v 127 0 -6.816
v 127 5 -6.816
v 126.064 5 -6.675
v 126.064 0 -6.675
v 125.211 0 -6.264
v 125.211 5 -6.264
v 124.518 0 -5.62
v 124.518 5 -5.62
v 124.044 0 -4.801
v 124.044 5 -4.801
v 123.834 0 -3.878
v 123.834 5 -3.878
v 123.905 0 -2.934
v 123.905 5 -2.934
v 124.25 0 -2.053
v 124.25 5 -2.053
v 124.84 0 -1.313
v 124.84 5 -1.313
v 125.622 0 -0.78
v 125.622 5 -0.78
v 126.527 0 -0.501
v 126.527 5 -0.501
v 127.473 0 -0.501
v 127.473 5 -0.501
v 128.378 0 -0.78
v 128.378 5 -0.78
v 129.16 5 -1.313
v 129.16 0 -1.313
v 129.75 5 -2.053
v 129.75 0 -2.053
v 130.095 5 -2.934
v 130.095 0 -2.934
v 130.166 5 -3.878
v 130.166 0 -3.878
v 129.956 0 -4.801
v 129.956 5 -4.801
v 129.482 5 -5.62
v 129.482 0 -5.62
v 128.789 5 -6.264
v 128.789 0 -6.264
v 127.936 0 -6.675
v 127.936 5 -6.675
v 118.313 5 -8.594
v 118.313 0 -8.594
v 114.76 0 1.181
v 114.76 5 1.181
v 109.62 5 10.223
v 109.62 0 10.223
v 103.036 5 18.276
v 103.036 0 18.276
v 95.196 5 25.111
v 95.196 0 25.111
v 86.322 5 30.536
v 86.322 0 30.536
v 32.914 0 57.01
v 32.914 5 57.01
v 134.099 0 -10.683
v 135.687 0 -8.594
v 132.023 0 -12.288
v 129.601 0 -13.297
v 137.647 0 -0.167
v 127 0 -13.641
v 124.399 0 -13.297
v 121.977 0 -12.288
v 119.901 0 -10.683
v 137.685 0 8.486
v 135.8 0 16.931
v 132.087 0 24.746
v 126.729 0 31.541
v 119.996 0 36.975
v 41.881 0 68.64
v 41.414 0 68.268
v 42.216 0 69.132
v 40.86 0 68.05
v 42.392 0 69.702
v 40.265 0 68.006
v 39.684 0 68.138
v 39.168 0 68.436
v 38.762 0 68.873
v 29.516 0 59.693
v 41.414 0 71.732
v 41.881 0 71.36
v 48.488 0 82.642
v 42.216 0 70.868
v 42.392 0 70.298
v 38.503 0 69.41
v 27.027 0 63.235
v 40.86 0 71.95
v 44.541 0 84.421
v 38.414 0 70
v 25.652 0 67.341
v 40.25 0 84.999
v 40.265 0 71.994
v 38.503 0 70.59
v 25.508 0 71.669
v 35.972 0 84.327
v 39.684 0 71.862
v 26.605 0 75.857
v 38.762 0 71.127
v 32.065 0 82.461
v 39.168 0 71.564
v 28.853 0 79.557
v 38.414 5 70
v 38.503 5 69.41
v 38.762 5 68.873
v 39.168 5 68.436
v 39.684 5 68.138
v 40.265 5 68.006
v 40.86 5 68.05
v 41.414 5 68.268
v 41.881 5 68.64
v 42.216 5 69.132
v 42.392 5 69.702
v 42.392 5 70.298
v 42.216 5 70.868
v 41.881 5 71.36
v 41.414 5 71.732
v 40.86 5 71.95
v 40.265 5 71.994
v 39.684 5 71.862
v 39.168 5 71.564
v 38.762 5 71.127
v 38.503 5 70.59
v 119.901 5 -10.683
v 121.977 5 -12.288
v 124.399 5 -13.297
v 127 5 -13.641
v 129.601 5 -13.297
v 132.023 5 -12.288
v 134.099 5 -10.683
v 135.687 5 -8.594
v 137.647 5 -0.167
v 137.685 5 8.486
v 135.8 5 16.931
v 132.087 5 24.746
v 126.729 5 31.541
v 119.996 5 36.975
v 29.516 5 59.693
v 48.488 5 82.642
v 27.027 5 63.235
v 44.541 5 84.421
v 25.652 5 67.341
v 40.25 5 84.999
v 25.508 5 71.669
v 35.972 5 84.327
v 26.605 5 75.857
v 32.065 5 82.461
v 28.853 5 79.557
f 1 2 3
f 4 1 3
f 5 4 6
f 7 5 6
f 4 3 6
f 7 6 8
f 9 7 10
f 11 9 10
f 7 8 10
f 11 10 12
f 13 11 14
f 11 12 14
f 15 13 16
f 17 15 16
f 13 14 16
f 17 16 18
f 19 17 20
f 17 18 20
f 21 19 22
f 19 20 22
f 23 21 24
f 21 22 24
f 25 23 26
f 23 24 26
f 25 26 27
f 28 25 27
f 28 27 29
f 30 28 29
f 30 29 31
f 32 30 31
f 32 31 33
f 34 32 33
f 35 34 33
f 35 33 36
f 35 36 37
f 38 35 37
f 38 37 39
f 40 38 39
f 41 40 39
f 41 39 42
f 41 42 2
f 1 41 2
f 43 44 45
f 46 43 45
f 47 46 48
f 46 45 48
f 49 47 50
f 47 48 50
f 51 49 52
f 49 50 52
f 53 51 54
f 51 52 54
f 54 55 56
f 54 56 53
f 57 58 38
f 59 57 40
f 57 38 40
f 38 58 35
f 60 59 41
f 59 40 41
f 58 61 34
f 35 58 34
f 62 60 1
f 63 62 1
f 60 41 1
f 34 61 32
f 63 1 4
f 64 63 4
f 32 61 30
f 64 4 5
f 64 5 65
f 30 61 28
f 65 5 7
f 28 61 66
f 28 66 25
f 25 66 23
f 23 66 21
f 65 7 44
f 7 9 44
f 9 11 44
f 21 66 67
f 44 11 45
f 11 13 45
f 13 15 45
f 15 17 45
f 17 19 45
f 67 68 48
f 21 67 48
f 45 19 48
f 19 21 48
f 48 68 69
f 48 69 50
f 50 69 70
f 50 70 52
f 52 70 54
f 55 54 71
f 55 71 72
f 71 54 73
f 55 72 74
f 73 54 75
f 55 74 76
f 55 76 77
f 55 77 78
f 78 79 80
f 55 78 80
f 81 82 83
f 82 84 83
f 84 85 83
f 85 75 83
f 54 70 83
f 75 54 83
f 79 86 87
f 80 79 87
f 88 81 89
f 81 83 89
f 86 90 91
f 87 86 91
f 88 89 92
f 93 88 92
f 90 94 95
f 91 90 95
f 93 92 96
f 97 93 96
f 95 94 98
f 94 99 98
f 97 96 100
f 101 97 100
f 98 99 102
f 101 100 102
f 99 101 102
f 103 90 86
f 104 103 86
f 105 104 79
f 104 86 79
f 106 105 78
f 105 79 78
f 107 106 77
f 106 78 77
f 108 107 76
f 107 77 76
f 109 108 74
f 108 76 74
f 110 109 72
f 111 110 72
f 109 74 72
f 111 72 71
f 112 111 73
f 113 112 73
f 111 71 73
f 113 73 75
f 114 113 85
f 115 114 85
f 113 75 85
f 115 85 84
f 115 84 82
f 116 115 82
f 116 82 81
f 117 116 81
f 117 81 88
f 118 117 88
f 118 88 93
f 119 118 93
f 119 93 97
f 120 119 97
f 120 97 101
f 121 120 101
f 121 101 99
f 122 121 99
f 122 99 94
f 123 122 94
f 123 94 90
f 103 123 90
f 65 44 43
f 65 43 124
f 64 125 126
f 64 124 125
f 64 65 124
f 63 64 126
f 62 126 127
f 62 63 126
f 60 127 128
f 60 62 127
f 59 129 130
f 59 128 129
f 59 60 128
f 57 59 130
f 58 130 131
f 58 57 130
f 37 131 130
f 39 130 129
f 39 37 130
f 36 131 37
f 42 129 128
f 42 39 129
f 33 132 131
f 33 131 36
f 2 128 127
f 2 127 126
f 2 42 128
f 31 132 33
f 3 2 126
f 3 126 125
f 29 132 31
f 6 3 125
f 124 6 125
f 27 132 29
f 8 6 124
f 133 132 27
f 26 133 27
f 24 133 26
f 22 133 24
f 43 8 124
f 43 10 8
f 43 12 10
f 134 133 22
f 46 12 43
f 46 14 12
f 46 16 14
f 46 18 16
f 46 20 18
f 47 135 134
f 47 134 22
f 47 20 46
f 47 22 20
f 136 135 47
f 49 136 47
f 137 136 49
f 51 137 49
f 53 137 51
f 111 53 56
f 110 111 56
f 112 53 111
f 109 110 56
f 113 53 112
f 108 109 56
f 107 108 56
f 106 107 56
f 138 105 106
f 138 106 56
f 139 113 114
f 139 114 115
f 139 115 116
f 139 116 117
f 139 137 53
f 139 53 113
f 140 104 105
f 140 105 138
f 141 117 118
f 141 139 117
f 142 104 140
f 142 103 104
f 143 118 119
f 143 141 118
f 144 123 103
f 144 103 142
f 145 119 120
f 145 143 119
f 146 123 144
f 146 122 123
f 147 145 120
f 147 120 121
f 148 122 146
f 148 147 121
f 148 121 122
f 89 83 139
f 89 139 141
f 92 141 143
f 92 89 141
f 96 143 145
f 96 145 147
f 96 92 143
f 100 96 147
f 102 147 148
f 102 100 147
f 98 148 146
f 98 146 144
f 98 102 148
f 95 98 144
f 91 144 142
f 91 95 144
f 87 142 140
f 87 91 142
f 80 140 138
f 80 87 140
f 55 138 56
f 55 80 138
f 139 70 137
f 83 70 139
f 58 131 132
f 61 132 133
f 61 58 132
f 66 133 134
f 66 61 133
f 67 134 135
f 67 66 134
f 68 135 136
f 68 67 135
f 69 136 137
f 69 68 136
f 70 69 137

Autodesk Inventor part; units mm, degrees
ref_plane "YZ Plane" through (0, 0, 0) normal (1, 0, 0) x (0, 1, 0)
ref_plane "XZ Plane" through (0, 0, 0) normal (0, 1, 0) x (-1, 0, 0)
ref_plane "XY Plane" through (0, 0, 0) normal (0, 0, 1) x (1, 0, 0)
sketch "Cara" plane through (0, 0, 0) normal (0, 0, 1) x (1, 0, 0)
  line L0 (-22.1935, -24.9393) -> (-15.1747, -17.9205)
  arc A0 (-12.474, -17.8034) -> (-15.1747, -17.9205) centre (-13.7605, -19.3347) ccw
  arc A1 (-12.474, -17.8034) -> (-6.107, -21.4794) centre (1.0981, -1.6477) ccw
  arc A2 (-4.8581, -23.8768) -> (-6.107, -21.4794) centre (-6.79, -23.3592) ccw
  line L1 (-4.8581, -23.8768) -> (-7.4272, -33.4646)
  arc A3 (-9.9928, -34.8439) -> (-7.4272, -33.4646) centre (-9.359, -32.947) ccw
  arc A4 (-22.1052, -27.8509) -> (-9.9928, -34.8439) centre (1.0981, -1.6477) ccw
  arc A5 (-22.1935, -24.9393) -> (-22.1052, -27.8509) centre (-20.7793, -26.3535) ccw
  line L2 (9.6235, -33.4646) -> (7.0544, -23.8768)
  arc A6 (8.3033, -21.4794) -> (7.0544, -23.8768) centre (8.9863, -23.3592) ccw
  arc A7 (8.3033, -21.4794) -> (14.6703, -17.8034) centre (1.0981, -1.6477) ccw
  arc A8 (17.371, -17.9205) -> (14.6703, -17.8034) centre (15.9568, -19.3347) ccw
  line L3 (17.371, -17.9205) -> (24.3898, -24.9393)
  arc A9 (24.3015, -27.8509) -> (24.3898, -24.9393) centre (22.9756, -26.3535) ccw
  arc A10 (12.1891, -34.8439) -> (24.3015, -27.8509) centre (1.0981, -1.6477) ccw
  arc A11 (9.6235, -33.4646) -> (12.1891, -34.8439) centre (11.5553, -32.947) ccw
  line L4 (32.9151, -10.173) -> (23.3272, -7.604)
  arc A12 (21.8755, -5.3237) -> (23.3272, -7.604) centre (23.8449, -5.6721) ccw
  arc A13 (21.8755, -5.3237) -> (21.8755, 2.0283) centre (1.0981, -1.6477) ccw
  arc A14 (23.3272, 4.3086) -> (21.8755, 2.0283) centre (23.8449, 2.3767) ccw
  line L5 (23.3272, 4.3086) -> (32.9151, 6.8776)
  arc A15 (35.3924, 5.3454) -> (32.9151, 6.8776) centre (33.4327, 4.9458) ccw
  arc A16 (35.3924, -8.6408) -> (35.3924, 5.3454) centre (1.0981, -1.6477) ccw
  arc A17 (32.9151, -10.173) -> (35.3924, -8.6408) centre (33.4327, -8.2412) ccw
  line L6 (24.3898, 21.6439) -> (17.371, 14.6251)
  arc A18 (14.6703, 14.508) -> (17.371, 14.6251) centre (15.9568, 16.0394) ccw
  arc A19 (14.6703, 14.508) -> (8.3033, 18.184) centre (1.0981, -1.6477) ccw
  arc A20 (7.0544, 20.5814) -> (8.3033, 18.184) centre (8.9863, 20.0638) ccw
  line L7 (7.0544, 20.5814) -> (9.6235, 30.1693)
  arc A21 (12.1891, 31.5486) -> (9.6235, 30.1693) centre (11.5553, 29.6516) ccw
  arc A22 (24.3015, 24.5555) -> (12.1891, 31.5486) centre (1.0981, -1.6477) ccw
  arc A23 (24.3898, 21.6439) -> (24.3015, 24.5555) centre (22.9756, 23.0582) ccw
  line L8 (-7.4272, 30.1693) -> (-4.8581, 20.5814)
  arc A24 (-6.107, 18.184) -> (-4.8581, 20.5814) centre (-6.79, 20.0638) ccw
  arc A25 (-6.107, 18.184) -> (-12.474, 14.508) centre (1.0981, -1.6477) ccw
  arc A26 (-15.1747, 14.6251) -> (-12.474, 14.508) centre (-13.7605, 16.0394) ccw
  line L9 (-15.1747, 14.6251) -> (-22.1935, 21.6439)
  arc A27 (-22.1052, 24.5555) -> (-22.1935, 21.6439) centre (-20.7793, 23.0582) ccw
  arc A28 (-9.9928, 31.5486) -> (-22.1052, 24.5555) centre (1.0981, -1.6477) ccw
  arc A29 (-7.4272, 30.1693) -> (-9.9928, 31.5486) centre (-9.359, 29.6516) ccw
  line L10 (-30.7188, 6.8776) -> (-21.131, 4.3086)
  arc A30 (-19.6792, 2.0283) -> (-21.131, 4.3086) centre (-21.6486, 2.3767) ccw
  arc A31 (-19.6792, 2.0283) -> (-19.6792, -5.3237) centre (1.0981, -1.6477) ccw
  arc A32 (-21.131, -7.604) -> (-19.6792, -5.3237) centre (-21.6486, -5.6721) ccw
  line L11 (-21.131, -7.604) -> (-30.7188, -10.173)
  arc A33 (-33.1961, -8.6408) -> (-30.7188, -10.173) centre (-31.2365, -8.2412) ccw
  arc A34 (-33.1961, 5.3454) -> (-33.1961, -8.6408) centre (1.0981, -1.6477) ccw
  arc A35 (-30.7188, 6.8776) -> (-33.1961, 5.3454) centre (-31.2365, 4.9458) ccw
  circle A36 centre (-37.4568, -19.3542) radius 1.5875
  circle A37 centre (39.653, 16.0588) radius 1.5875
  circle A38 centre (-16.6083, 36.9072) radius 1.5875
  circle A39 centre (18.8046, -40.2026) radius 1.5875
  circle A40 centre (1.0981, -1.6477) radius 15.5
  arc A41 (13.186, 39.6183) -> (16.9444, 39.4394) centre (15.4349, 47.2957) ccw
  arc A42 (13.186, 39.6183) -> (-10.9897, 39.6183) centre (1.0981, -1.6477) ccw
  arc A43 (-15.0916, 39.5133) -> (-10.9897, 39.6183) centre (-13.2386, 47.2957) ccw
  arc A44 (-15.0916, 39.5133) -> (-19.5734, 37.455) centre (-16.0181, 35.6221) ccw
  arc A45 (-22.3261, 34.412) -> (-19.5734, 37.455) centre (-26.6841, 41.1208) ccw
  arc A46 (-22.3261, 34.412) -> (-34.8255, 21.9848) centre (1.0981, -1.6477) ccw
  arc A47 (-37.5746, 19.4158) -> (-34.8255, 21.9848) centre (-41.5089, 26.3816) ccw
  arc A48 (-39.989, 14.1986) -> (-37.5746, 19.4158) centre (-37.4054, 16.1703) ccw
  arc A49 (-40.1679, 10.4402) -> (-39.989, 14.1986) centre (-47.8453, 12.6891) ccw
  arc A50 (-40.1679, 10.4402) -> (-40.2027, -13.6161) centre (1.0981, -1.6477) ccw
  arc A51 (-40.1338, -17.8165) -> (-40.2027, -13.6161) centre (-47.8865, -15.8428) ccw
  arc A52 (-40.1338, -17.8165) -> (-38.0349, -22.3868) centre (-36.2575, -18.8034) ccw
  arc A53 (-34.8937, -25.1762) -> (-38.0349, -22.3868) centre (-41.5898, -29.5536) ccw
  arc A54 (-34.8937, -25.1762) -> (-22.5344, -37.5713) centre (1.0981, -1.6477) ccw
  arc A55 (-19.9654, -40.3204) -> (-22.5344, -37.5713) centre (-26.9311, -44.2547) ccw
  arc A56 (-14.7481, -42.7348) -> (-19.9654, -40.3204) centre (-16.7198, -40.1512) ccw
  arc A57 (-10.9897, -42.9137) -> (-14.7481, -42.7348) centre (-13.2386, -50.5911) ccw
  arc A58 (-10.9897, -42.9137) -> (13.0666, -42.9485) centre (1.0981, -1.6477) ccw
  arc A59 (17.2235, -42.8687) -> (13.0666, -42.9485) centre (15.2932, -50.6324) ccw
  arc A60 (17.2235, -42.8687) -> (21.7574, -40.7935) centre (18.1887, -38.9869) ccw
  arc A61 (24.5347, -37.6994) -> (21.7574, -40.7935) centre (28.895, -44.4067) ccw
  arc A62 (24.5347, -37.6994) -> (37.0217, -25.2802) centre (1.0981, -1.6477) ccw
  arc A63 (39.7709, -22.7112) -> (37.0217, -25.2802) centre (43.7052, -29.6769) ccw
  arc A64 (42.1093, -17.3982) -> (39.7709, -22.7112) centre (39.6017, -19.4656) ccw
  arc A65 (42.3332, -13.8408) -> (42.1093, -17.3982) centre (50.0048, -16.1093) ccw
  arc A66 (42.3332, -13.8408) -> (42.3989, 10.3207) centre (1.0981, -1.6477) ccw
  arc A67 (42.3301, 14.5211) -> (42.3989, 10.3207) centre (50.0828, 12.5474) ccw
  arc A68 (42.3301, 14.5211) -> (40.2312, 19.0914) centre (38.4538, 15.508) ccw
  arc A69 (37.09, 21.8808) -> (40.2312, 19.0914) centre (43.7861, 26.2582) ccw
  arc A70 (37.09, 21.8808) -> (24.7307, 34.2759) centre (1.0981, -1.6477) ccw
  arc A71 (22.1617, 37.0251) -> (24.7307, 34.2759) centre (29.1274, 40.9594) ccw
  arc A72 (16.9444, 39.4394) -> (22.1617, 37.0251) centre (18.9161, 36.8558) ccw
  arc A73 (-38.8583, 20.9988) -> (-42.0265, 14.1525) centre (-36.2077, 15.616) ccw
  spline S0 degree 3 poles (-40.2504, 14.5992) (-40.3671, 14.8104) (-40.4601, 15.0344) (-40.6458, 15.6766) (-40.6826, 16.1053) (-40.5958, 16.8869) (-40.4968, 17.2357) (-40.1864, 17.8912) (-39.9757, 18.1925) (-39.4148, 18.7612) (-39.0515, 19.0059) (-38.4565, 19.2528) (-38.255, 19.3143) (-38.0493, 19.3558) knots 0 0 0 0 0.118944 0.118944 0.328096 0.328096 0.504735 0.504735 0.683825 0.683825 0.89662 0.89662 1 1 1 1
  line L12 (-38.8583, 20.9988) -> (-38.0493, 19.3558)
  arc A74 (-38.8583, 20.9988) -> (-42.0265, 14.1525) centre (-36.2077, 15.616) ccw
  line L13 (-40.2504, 14.5992) -> (-42.0265, 14.1525)
  line L14 (-38.5582, 21.1573) -> (-37.5746, 19.4158)
  arc A75 (-37.5746, 19.4158) -> (-34.8255, 21.9848) centre (-41.5089, 26.3816) ccw
  line L15 (-36.4963, 23.084) -> (-34.8255, 21.9848)
  arc A76 (-38.5582, 21.1573) -> (-36.4963, 23.084) centre (-41.5089, 26.3816) ccw
  spline S1 degree 3 poles (-38.0493, 19.3558) (-37.9271, 19.3805) (-37.8093, 19.397) (-37.6564, 19.4108) (-37.6155, 19.4137) (-37.5746, 19.4158) knots 0 0 0 0 0.731153 0.731153 1 1 1 1
  line L16 (-38.5582, 21.1573) -> (-37.5746, 19.4158)
  arc A77 (-38.8583, 20.9988) -> (-38.5582, 21.1573) centre (-41.5089, 26.3816) ccw
  line L17 (-38.8583, 20.9988) -> (-38.0493, 19.3558)
  spline S2 degree 3 poles (-39.989, 14.1986) (-40.081, 14.3191) (-40.1695, 14.4526) (-40.2504, 14.5992) knots 0 0 0 0 1 1 1 1
  line L18 (-40.2504, 14.5992) -> (-42.0265, 14.1525)
  arc A78 (-41.953, 13.8212) -> (-42.0265, 14.1525) centre (-47.8453, 12.6891) ccw
  line L19 (-39.989, 14.1986) -> (-41.953, 13.8212)
  line L20 (-39.989, 14.1986) -> (-41.953, 13.8212)
  arc A79 (-42.0872, 11.0024) -> (-41.953, 13.8212) centre (-47.8453, 12.6891) ccw
  line L21 (-42.0872, 11.0024) -> (-40.1679, 10.4402)
  arc A80 (-40.1679, 10.4402) -> (-39.989, 14.1986) centre (-47.8453, 12.6891) ccw
  arc A81 (-42.0872, 11.0024) -> (-42.1236, -14.1728) centre (1.0981, -1.6477) ccw
  line L22 (-36.4963, 23.084) -> (-34.8255, 21.9848)
  arc A82 (-22.3261, 34.412) -> (-34.8255, 21.9848) centre (1.0981, -1.6477) ccw
  line L23 (-23.4156, 36.0892) -> (-22.3261, 34.412)
  arc A83 (-23.4156, 36.0892) -> (-36.4963, 23.084) centre (1.0981, -1.6477) ccw
  line L24 (-23.4156, 36.0892) -> (-22.3261, 34.412)
  arc A84 (-22.3261, 34.412) -> (-19.5734, 37.455) centre (-26.6841, 41.1208) ccw
  line L25 (-21.3511, 38.3714) -> (-19.5734, 37.455)
  arc A85 (-23.4156, 36.0892) -> (-21.3511, 38.3714) centre (-26.6841, 41.1208) ccw
  line L26 (-21.3511, 38.3714) -> (-19.5734, 37.455)
  arc A86 (-15.0916, 39.5133) -> (-19.5734, 37.455) centre (-16.0181, 35.6221) ccw
  line L27 (-14.6284, 41.4589) -> (-15.0916, 39.5133)
  arc A87 (-14.6284, 41.4589) -> (-21.3511, 38.3714) centre (-16.0181, 35.6221) ccw
  line L28 (-14.6284, 41.4589) -> (-15.0916, 39.5133)
  arc A88 (-15.0916, 39.5133) -> (-10.9897, 39.6183) centre (-13.2386, 47.2957) ccw
  line L29 (-11.5519, 41.5377) -> (-10.9897, 39.6183)
  arc A89 (-14.6284, 41.4589) -> (-11.5519, 41.5377) centre (-13.2386, 47.2957) ccw
  line L30 (-11.5519, 41.5377) -> (-10.9897, 39.6183)
  arc A90 (13.186, 39.6183) -> (-10.9897, 39.6183) centre (1.0981, -1.6477) ccw
  line L31 (13.7482, 41.5377) -> (13.186, 39.6183)
  arc A91 (13.7482, 41.5377) -> (-11.5519, 41.5377) centre (1.0981, -1.6477) ccw
  line L32 (16.9444, 39.4394) -> (16.567, 41.4035)
  arc A92 (13.7482, 41.5377) -> (16.567, 41.4035) centre (15.4349, 47.2957) ccw
  line L33 (13.7482, 41.5377) -> (13.186, 39.6183)
  arc A93 (13.186, 39.6183) -> (16.9444, 39.4394) centre (15.4349, 47.2957) ccw
  spline S3 degree 3 poles (16.9444, 39.4394) (17.0649, 39.5314) (17.1985, 39.6199) (17.3451, 39.7009) knots 0 0 0 0 1 1 1 1
  line L34 (17.3451, 39.7009) -> (16.8984, 41.4769)
  arc A94 (16.567, 41.4035) -> (16.8984, 41.4769) centre (15.4349, 47.2957) ccw
  line L35 (16.9444, 39.4394) -> (16.567, 41.4035)
  spline S4 degree 3 poles (17.3451, 39.7009) (17.5563, 39.8175) (17.7803, 39.9105) (18.4224, 40.0962) (18.8512, 40.133) (19.6327, 40.0462) (19.9815, 39.9473) (20.6371, 39.6368) (20.9383, 39.4261) (21.507, 38.8652) (21.7517, 38.502) (21.9986, 37.907) (22.0601, 37.7054) (22.1017, 37.4997) knots 0 0 0 0 0.118944 0.118944 0.328096 0.328096 0.504735 0.504735 0.683825 0.683825 0.89662 0.89662 1 1 1 1
  line L36 (23.7446, 38.3088) -> (22.1017, 37.4997)
  arc A95 (23.7446, 38.3088) -> (16.8984, 41.4769) centre (18.3618, 35.6581) ccw
  line L37 (17.3451, 39.7009) -> (16.8984, 41.4769)
  line L38 (37.09, 21.8808) -> (38.764, 22.9751)
  arc A96 (38.764, 22.9751) -> (25.8298, 35.9468) centre (1.0981, -1.6477) ccw
  line L39 (25.8298, 35.9468) -> (24.7307, 34.2759)
  arc A97 (37.09, 21.8808) -> (24.7307, 34.2759) centre (1.0981, -1.6477) ccw
  line L40 (23.9031, 38.0086) -> (22.1617, 37.0251)
  arc A98 (22.1617, 37.0251) -> (24.7307, 34.2759) centre (29.1274, 40.9594) ccw
  line L41 (25.8298, 35.9468) -> (24.7307, 34.2759)
  arc A99 (23.9031, 38.0086) -> (25.8298, 35.9468) centre (29.1274, 40.9594) ccw
  spline S5 degree 3 poles (22.1017, 37.4997) (22.1264, 37.3775) (22.1428, 37.2598) (22.1566, 37.1069) (22.1595, 37.0659) (22.1617, 37.0251) knots 0 0 0 0 0.731153 0.731153 1 1 1 1
  line L42 (23.9031, 38.0086) -> (22.1617, 37.0251)
  arc A100 (23.7446, 38.3088) -> (23.9031, 38.0086) centre (29.1274, 40.9594) ccw
  line L43 (23.7446, 38.3088) -> (22.1017, 37.4997)
  line L44 (37.09, 21.8808) -> (38.764, 22.9751)
  arc A101 (37.09, 21.8808) -> (40.2312, 19.0914) centre (43.7861, 26.2582) ccw
  line L45 (41.1199, 20.8831) -> (40.2312, 19.0914)
  arc A102 (38.764, 22.9751) -> (41.1199, 20.8831) centre (43.7861, 26.2582) ccw
  line L46 (41.1199, 20.8831) -> (40.2312, 19.0914)
  arc A103 (42.3301, 14.5211) -> (40.2312, 19.0914) centre (38.4538, 15.508) ccw
  line L47 (44.2683, 14.0277) -> (42.3301, 14.5211)
  arc A104 (44.2683, 14.0277) -> (41.1199, 20.8831) centre (38.4538, 15.508) ccw
  line L48 (44.2683, 14.0277) -> (42.3301, 14.5211)
  arc A105 (42.3301, 14.5211) -> (42.3989, 10.3207) centre (50.0828, 12.5474) ccw
  line L49 (44.3199, 10.8774) -> (42.3989, 10.3207)
  arc A106 (44.2683, 14.0277) -> (44.3199, 10.8774) centre (50.0828, 12.5474) ccw
  line L50 (44.3199, 10.8774) -> (42.3989, 10.3207)
  arc A107 (42.3332, -13.8408) -> (42.3989, 10.3207) centre (1.0981, -1.6477) ccw
  line L51 (44.2511, -14.4079) -> (42.3332, -13.8408)
  arc A108 (44.2511, -14.4079) -> (44.3199, 10.8774) centre (1.0981, -1.6477) ccw
  spline S6 degree 3 poles (42.4708, -17.939) (42.66, -18.2947) (42.7816, -18.6826) (42.8764, -19.4825) (42.8492, -19.8873) (42.6667, -20.5952) (42.5369, -20.899) (42.1389, -21.5409) (41.845, -21.8556) (41.1886, -22.3275) (40.8415, -22.494) (40.3834, -22.6216) (40.2925, -22.6427) (40.2009, -22.6599) knots 0 0 0 0 0.198107 0.198107 0.395669 0.395669 0.556952 0.556952 0.766408 0.766408 0.954091 0.954091 1 1 1 1
  line L52 (41.0245, -24.3091) -> (40.2009, -22.6599)
  arc A109 (41.0245, -24.3091) -> (44.1743, -17.5253) centre (38.3438, -18.9413) ccw
  line L53 (42.4708, -17.939) -> (44.1743, -17.5253)
  line L54 (42.1093, -17.3982) -> (44.0832, -17.076)
  arc A110 (44.2511, -14.4079) -> (44.0832, -17.076) centre (50.0048, -16.1093) ccw
  line L55 (44.2511, -14.4079) -> (42.3332, -13.8408)
  arc A111 (42.3332, -13.8408) -> (42.1093, -17.3982) centre (50.0048, -16.1093) ccw
  spline S7 degree 3 poles (42.1093, -17.3982) (42.1251, -17.4173) (42.1406, -17.4367) (42.2692, -17.6002) (42.376, -17.7609) (42.4708, -17.939) knots 0 0 0 0 0.119683 0.119683 1 1 1 1
  line L56 (42.4708, -17.939) -> (44.1743, -17.5253)
  arc A112 (44.0832, -17.076) -> (44.1743, -17.5253) centre (50.0048, -16.1093) ccw
  line L57 (42.1093, -17.3982) -> (44.0832, -17.076)
  spline S8 degree 3 poles (40.2009, -22.6599) (40.0946, -22.6799) (39.9919, -22.6936) (39.8527, -22.7062) (39.8117, -22.7091) (39.7709, -22.7112) knots 0 0 0 0 0.704713 0.704713 1 1 1 1
  line L58 (40.7545, -24.4527) -> (39.7709, -22.7112)
  arc A113 (41.0245, -24.3091) -> (40.7545, -24.4527) centre (43.7052, -29.6769) ccw
  line L59 (41.0245, -24.3091) -> (40.2009, -22.6599)
  line L60 (40.7545, -24.4527) -> (39.7709, -22.7112)
  arc A114 (39.7709, -22.7112) -> (37.0217, -25.2802) centre (43.7052, -29.6769) ccw
  line L61 (38.6926, -26.3794) -> (37.0217, -25.2802)
  arc A115 (40.7545, -24.4527) -> (38.6926, -26.3794) centre (43.7052, -29.6769) ccw
  line L62 (38.6926, -26.3794) -> (37.0217, -25.2802)
  arc A116 (24.5347, -37.6994) -> (37.0217, -25.2802) centre (1.0981, -1.6477) ccw
  line L63 (25.6248, -39.3763) -> (24.5347, -37.6994)
  arc A117 (25.6248, -39.3763) -> (38.6926, -26.3794) centre (1.0981, -1.6477) ccw
  line L64 (25.6248, -39.3763) -> (24.5347, -37.6994)
  arc A118 (24.5347, -37.6994) -> (21.7574, -40.7935) centre (28.895, -44.4067) ccw
  line L65 (23.5418, -41.6968) -> (21.7574, -40.7935)
  arc A119 (25.6248, -39.3763) -> (23.5418, -41.6968) centre (28.895, -44.4067) ccw
  line L66 (23.5418, -41.6968) -> (21.7574, -40.7935)
  arc A120 (17.2235, -42.8687) -> (21.7574, -40.7935) centre (18.1887, -38.9869) ccw
  line L67 (16.7409, -44.8096) -> (17.2235, -42.8687)
  arc A121 (16.7409, -44.8096) -> (23.5418, -41.6968) centre (18.1887, -38.9869) ccw
  line L68 (16.7409, -44.8096) -> (17.2235, -42.8687)
  arc A122 (17.2235, -42.8687) -> (13.0666, -42.9485) centre (15.2932, -50.6324) ccw
  line L69 (13.6232, -44.8695) -> (13.0666, -42.9485)
  arc A123 (16.7409, -44.8096) -> (13.6232, -44.8695) centre (15.2932, -50.6324) ccw
  arc A124 (-10.9897, -42.9137) -> (13.0666, -42.9485) centre (1.0981, -1.6477) ccw
  line L70 (13.6232, -44.8695) -> (13.0666, -42.9485)
  arc A125 (-10.9897, -42.9137) -> (13.0666, -42.9485) centre (1.0981, -1.6477) ccw
  line L71 (-11.5519, -44.8331) -> (-10.9897, -42.9137)
  arc A126 (-11.5519, -44.8331) -> (13.6232, -44.8695) centre (1.0981, -1.6477) ccw
  line L72 (-14.7481, -42.7348) -> (-14.3707, -44.6989)
  arc A127 (-11.5519, -44.8331) -> (-14.3707, -44.6989) centre (-13.2386, -50.5911) ccw
  line L73 (-11.5519, -44.8331) -> (-10.9897, -42.9137)
  arc A128 (-10.9897, -42.9137) -> (-14.7481, -42.7348) centre (-13.2386, -50.5911) ccw
  spline S9 degree 3 poles (-15.1488, -42.9963) (-15.36, -43.1129) (-15.584, -43.2059) (-16.2261, -43.3916) (-16.6549, -43.4284) (-17.4365, -43.3416) (-17.7852, -43.2427) (-18.4408, -42.9322) (-18.742, -42.7215) (-19.3107, -42.1606) (-19.5554, -41.7973) (-19.8023, -41.2024) (-19.8638, -41.0008) (-19.9054, -40.7951) knots 0 0 0 0 0.118944 0.118944 0.328096 0.328096 0.504735 0.504735 0.683825 0.683825 0.89662 0.89662 1 1 1 1
  line L74 (-21.5483, -41.6041) -> (-19.9054, -40.7951)
  arc A129 (-21.5483, -41.6041) -> (-14.7021, -44.7723) centre (-16.1656, -38.9535) ccw
  line L75 (-15.1488, -42.9963) -> (-14.7021, -44.7723)
  spline S10 degree 3 poles (-14.7481, -42.7348) (-14.8686, -42.8268) (-15.0022, -42.9153) (-15.1488, -42.9963) knots 0 0 0 0 1 1 1 1
  line L76 (-15.1488, -42.9963) -> (-14.7021, -44.7723)
  arc A130 (-14.3707, -44.6989) -> (-14.7021, -44.7723) centre (-13.2386, -50.5911) ccw
  line L77 (-14.7481, -42.7348) -> (-14.3707, -44.6989)
  spline S11 degree 3 poles (-19.9054, -40.7951) (-19.9301, -40.6729) (-19.9466, -40.5552) (-19.9604, -40.4023) (-19.9633, -40.3613) (-19.9654, -40.3204) knots 0 0 0 0 0.731153 0.731153 1 1 1 1
  line L78 (-21.7068, -41.304) -> (-19.9654, -40.3204)
  arc A131 (-21.5483, -41.6041) -> (-21.7068, -41.304) centre (-26.9311, -44.2547) ccw
  line L79 (-21.5483, -41.6041) -> (-19.9054, -40.7951)
  circle A132 centre (-16.7198, -40.1512) radius 3.25
  circle A133 centre (-16.7198, -40.1512) radius 1.5875
  circle A134 centre (39.6017, -19.4656) radius 3.25
  circle A135 centre (39.6017, -19.4656) radius 1.5875
  circle A136 centre (18.9161, 36.8558) radius 3.25
  circle A137 centre (18.9161, 36.8558) radius 1.5875
  circle A138 centre (-37.4054, 16.1703) radius 3.25
  circle A139 centre (-37.4054, 16.1703) radius 1.5875
  line L80 (-42.072, -17.3231) -> (-40.1338, -17.8165)
  arc A140 (-40.1338, -17.8165) -> (-40.2027, -13.6161) centre (-47.8865, -15.8428) ccw
  line L81 (-42.1236, -14.1728) -> (-40.2027, -13.6161)
  arc A141 (-42.072, -17.3231) -> (-42.1236, -14.1728) centre (-47.8865, -15.8428) ccw
  line L82 (-38.9237, -24.1785) -> (-38.0349, -22.3868)
  arc A142 (-40.1338, -17.8165) -> (-38.0349, -22.3868) centre (-36.2575, -18.8034) ccw
  line L83 (-42.072, -17.3231) -> (-40.1338, -17.8165)
  arc A143 (-42.072, -17.3231) -> (-38.9237, -24.1785) centre (-36.2575, -18.8034) ccw
  line L84 (-36.5677, -26.2705) -> (-34.8937, -25.1762)
  arc A144 (-34.8937, -25.1762) -> (-38.0349, -22.3868) centre (-41.5898, -29.5536) ccw
  line L85 (-38.9237, -24.1785) -> (-38.0349, -22.3868)
  arc A145 (-36.5677, -26.2705) -> (-38.9237, -24.1785) centre (-41.5898, -29.5536) ccw
  line L86 (-23.6336, -39.2421) -> (-22.5344, -37.5713)
  arc A146 (-34.8937, -25.1762) -> (-22.5344, -37.5713) centre (1.0981, -1.6477) ccw
  line L87 (-36.5677, -26.2705) -> (-34.8937, -25.1762)
  arc A147 (-36.5677, -26.2705) -> (-23.6336, -39.2421) centre (1.0981, -1.6477) ccw
  line L88 (-21.7068, -41.304) -> (-19.9654, -40.3204)
  arc A148 (-19.9654, -40.3204) -> (-22.5344, -37.5713) centre (-26.9311, -44.2547) ccw
  line L89 (-23.6336, -39.2421) -> (-22.5344, -37.5713)
  arc A149 (-21.7068, -41.304) -> (-23.6336, -39.2421) centre (-26.9311, -44.2547) ccw
  point P0 (1.3022, -1.7009)
  dimension "d1" = 30
  dimension "d2" = 40
  dimension "d3" = 70
  dimension "d4" = 90
  dimension "d5" = 65
  dimension "d6" = 95
  dimension "d7" = 100
  dimension "d8" = 72
  dimension "d9" = 17
  dimension "d10" = 110
  dimension "d11" = 4
sketch "Sketch1" plane through (0, 0, 0) normal (0, 1, 0) x (-1, 0, 0)
  line L0 (124.1031, 264.7872) -> (124.1031, -182.5054) construction
  line L1 (124.1031, -182.5054) -> (-344.0995, -182.5054) construction
  line L2 (-344.0995, -182.5054) -> (-344.0995, 264.7872) construction
  line L3 (-344.0995, 264.7872) -> (124.1031, 264.7872) construction
  circle A0 centre (0, 0) radius 50
  circle A1 centre (0, 0) radius 17.5
  line L4 (0, 0) -> (-80, -30.4436)
  line L5 (0, 0) -> (0, -17.5)
  line L6 (0, 0) -> (-17.5, 0)
  circle A2 centre (-80, -30.4436) radius 10
  line L7 (0, 0) -> (12.3744, -12.3744)
  line L8 (-80, -30.4436) -> (-80, -40.4436)
  line L9 (-80, -30.4436) -> (-72.9289, -37.5146)
  arc A3 (-80, -40.4436) -> (12.3744, -12.3744) centre (-63.3574, 70.821) ccw
  line L10 (-80, -30.4436) -> (-80, -20.4436)
  line L11 (0, 0) -> (-12.3744, 12.3744)
  arc A4 (-80, -20.4436) -> (-12.3744, 12.3744) centre (-83.4964, 72.8458) ccw
  circle A5 centre (0, 0) radius 7.6
  circle A6 centre (7.5887, 0.4145) radius 1.5
  circle A7 centre (-0.4145, 7.5887) radius 1.5
  circle A8 centre (-7.5887, -0.4145) radius 1.5
  circle A9 centre (0.4145, -7.5887) radius 1.5
  line L12 (-80, -30.4436) -> (-254.3472, 68.982)
  circle A10 centre (-127, -3.6407) radius 10
  arc A11 (-86.3218, 30.5363) -> (-118.3132, -8.5945) centre (-58.618, -24.7557) ccw
  line L13 (-118.3132, -8.5945) -> (-135.6868, -8.5945)
  arc A12 (-119.9959, 36.9754) -> (-135.6868, -8.5945) centre (-99.2074, 4.3311) ccw
  line L14 (0, 0) -> (0, 50)
  line L15 (0, 0) -> (-40.4145, 70)
  circle A13 centre (-40.4145, 70) radius 2
  circle A14 centre (-40.4145, 70) radius 15
  line L16 (-32.9145, 57.0096) -> (-86.3218, 30.5363)
  line L17 (-119.9959, 36.9754) -> (-48.488, 82.642)
  circle A15 centre (-127, -3.6407) radius 1.5
  point P0 (0, 25)
  dimension "d44" = 100
  dimension "d68" = 15.2
  dimension "d55" = 35
  dimension "d56" = 80
  dimension "d65" = 20
  dimension "d66" = 45
  dimension "d67" = 45
  dimension "d69" = 3
  dimension "d72" = 360
  dimension "d91" = 20
  dimension "d92" = 47
  dimension "d103" = 30
  dimension "d107" = 70
  dimension "d108" = 40
  dimension "d109" = 4
  dimension "d110" = 30
  dimension "d114" = 3
extrude "Extrusion3" add sketch "Sketch1" along normal blind 5 contours L16 A14 | L16 A11 A10 L12 A12 L17 A14 | L13 A12 A10 L12 A15 | L12 A15 A10 A11 | A10 L13 | A15 L12 | L12 A15 | A12 L12 A10 picked at (-47.1628, 78.1615)
hole "Hole1" at (127, 0, -3.6407) direction (0, 1, 0) diameter 6.35 end through all
properties part number "Link2V1"
